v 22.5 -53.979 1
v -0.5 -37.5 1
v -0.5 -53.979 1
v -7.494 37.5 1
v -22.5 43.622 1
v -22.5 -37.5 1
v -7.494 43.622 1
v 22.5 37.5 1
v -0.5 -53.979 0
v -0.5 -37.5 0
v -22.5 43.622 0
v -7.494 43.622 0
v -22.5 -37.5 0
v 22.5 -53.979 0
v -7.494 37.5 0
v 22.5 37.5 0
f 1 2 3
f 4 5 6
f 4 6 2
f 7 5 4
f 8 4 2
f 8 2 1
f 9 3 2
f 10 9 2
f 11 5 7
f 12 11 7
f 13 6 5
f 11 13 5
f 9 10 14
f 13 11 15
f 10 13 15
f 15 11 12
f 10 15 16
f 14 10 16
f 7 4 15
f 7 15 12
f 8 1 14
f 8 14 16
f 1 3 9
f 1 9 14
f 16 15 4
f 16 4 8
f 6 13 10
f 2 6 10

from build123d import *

# Parameters (mm, degrees)
SKETCH1_W           = 45
SKETCH1_H           = 75
BOSS_EXTRUDE1_DEPTH = 1
SKETCH2_W           = 23
SKETCH2_H           = 16.479286024
BOSS_EXTRUDE2_DEPTH = 1
SKETCH3_W           = 15.006040788
SKETCH3_H           = 6.122008564
BOSS_EXTRUDE3_DEPTH = 1


with BuildPart() as part:
    # Sketch1 → Boss-Extrude1 (new body)
    with BuildSketch(Plane.XY):
        Rectangle(SKETCH1_W, SKETCH1_H)
    extrude(amount=BOSS_EXTRUDE1_DEPTH)

    # Sketch2 → Boss-Extrude2 (add)
    with BuildSketch(Plane.XY.offset(1)):
        with Locations((11, -45.739643012)):
            Rectangle(SKETCH2_W, SKETCH2_H)
    extrude(amount=-BOSS_EXTRUDE2_DEPTH)

    # Sketch3 → Boss-Extrude3 (add)
    with BuildSketch(Plane.XY.offset(1)):
        with Locations((-14.996979606, 40.561004282)):
            Rectangle(SKETCH3_W, SKETCH3_H)
    extrude(amount=-BOSS_EXTRUDE3_DEPTH)


solid = part.part
